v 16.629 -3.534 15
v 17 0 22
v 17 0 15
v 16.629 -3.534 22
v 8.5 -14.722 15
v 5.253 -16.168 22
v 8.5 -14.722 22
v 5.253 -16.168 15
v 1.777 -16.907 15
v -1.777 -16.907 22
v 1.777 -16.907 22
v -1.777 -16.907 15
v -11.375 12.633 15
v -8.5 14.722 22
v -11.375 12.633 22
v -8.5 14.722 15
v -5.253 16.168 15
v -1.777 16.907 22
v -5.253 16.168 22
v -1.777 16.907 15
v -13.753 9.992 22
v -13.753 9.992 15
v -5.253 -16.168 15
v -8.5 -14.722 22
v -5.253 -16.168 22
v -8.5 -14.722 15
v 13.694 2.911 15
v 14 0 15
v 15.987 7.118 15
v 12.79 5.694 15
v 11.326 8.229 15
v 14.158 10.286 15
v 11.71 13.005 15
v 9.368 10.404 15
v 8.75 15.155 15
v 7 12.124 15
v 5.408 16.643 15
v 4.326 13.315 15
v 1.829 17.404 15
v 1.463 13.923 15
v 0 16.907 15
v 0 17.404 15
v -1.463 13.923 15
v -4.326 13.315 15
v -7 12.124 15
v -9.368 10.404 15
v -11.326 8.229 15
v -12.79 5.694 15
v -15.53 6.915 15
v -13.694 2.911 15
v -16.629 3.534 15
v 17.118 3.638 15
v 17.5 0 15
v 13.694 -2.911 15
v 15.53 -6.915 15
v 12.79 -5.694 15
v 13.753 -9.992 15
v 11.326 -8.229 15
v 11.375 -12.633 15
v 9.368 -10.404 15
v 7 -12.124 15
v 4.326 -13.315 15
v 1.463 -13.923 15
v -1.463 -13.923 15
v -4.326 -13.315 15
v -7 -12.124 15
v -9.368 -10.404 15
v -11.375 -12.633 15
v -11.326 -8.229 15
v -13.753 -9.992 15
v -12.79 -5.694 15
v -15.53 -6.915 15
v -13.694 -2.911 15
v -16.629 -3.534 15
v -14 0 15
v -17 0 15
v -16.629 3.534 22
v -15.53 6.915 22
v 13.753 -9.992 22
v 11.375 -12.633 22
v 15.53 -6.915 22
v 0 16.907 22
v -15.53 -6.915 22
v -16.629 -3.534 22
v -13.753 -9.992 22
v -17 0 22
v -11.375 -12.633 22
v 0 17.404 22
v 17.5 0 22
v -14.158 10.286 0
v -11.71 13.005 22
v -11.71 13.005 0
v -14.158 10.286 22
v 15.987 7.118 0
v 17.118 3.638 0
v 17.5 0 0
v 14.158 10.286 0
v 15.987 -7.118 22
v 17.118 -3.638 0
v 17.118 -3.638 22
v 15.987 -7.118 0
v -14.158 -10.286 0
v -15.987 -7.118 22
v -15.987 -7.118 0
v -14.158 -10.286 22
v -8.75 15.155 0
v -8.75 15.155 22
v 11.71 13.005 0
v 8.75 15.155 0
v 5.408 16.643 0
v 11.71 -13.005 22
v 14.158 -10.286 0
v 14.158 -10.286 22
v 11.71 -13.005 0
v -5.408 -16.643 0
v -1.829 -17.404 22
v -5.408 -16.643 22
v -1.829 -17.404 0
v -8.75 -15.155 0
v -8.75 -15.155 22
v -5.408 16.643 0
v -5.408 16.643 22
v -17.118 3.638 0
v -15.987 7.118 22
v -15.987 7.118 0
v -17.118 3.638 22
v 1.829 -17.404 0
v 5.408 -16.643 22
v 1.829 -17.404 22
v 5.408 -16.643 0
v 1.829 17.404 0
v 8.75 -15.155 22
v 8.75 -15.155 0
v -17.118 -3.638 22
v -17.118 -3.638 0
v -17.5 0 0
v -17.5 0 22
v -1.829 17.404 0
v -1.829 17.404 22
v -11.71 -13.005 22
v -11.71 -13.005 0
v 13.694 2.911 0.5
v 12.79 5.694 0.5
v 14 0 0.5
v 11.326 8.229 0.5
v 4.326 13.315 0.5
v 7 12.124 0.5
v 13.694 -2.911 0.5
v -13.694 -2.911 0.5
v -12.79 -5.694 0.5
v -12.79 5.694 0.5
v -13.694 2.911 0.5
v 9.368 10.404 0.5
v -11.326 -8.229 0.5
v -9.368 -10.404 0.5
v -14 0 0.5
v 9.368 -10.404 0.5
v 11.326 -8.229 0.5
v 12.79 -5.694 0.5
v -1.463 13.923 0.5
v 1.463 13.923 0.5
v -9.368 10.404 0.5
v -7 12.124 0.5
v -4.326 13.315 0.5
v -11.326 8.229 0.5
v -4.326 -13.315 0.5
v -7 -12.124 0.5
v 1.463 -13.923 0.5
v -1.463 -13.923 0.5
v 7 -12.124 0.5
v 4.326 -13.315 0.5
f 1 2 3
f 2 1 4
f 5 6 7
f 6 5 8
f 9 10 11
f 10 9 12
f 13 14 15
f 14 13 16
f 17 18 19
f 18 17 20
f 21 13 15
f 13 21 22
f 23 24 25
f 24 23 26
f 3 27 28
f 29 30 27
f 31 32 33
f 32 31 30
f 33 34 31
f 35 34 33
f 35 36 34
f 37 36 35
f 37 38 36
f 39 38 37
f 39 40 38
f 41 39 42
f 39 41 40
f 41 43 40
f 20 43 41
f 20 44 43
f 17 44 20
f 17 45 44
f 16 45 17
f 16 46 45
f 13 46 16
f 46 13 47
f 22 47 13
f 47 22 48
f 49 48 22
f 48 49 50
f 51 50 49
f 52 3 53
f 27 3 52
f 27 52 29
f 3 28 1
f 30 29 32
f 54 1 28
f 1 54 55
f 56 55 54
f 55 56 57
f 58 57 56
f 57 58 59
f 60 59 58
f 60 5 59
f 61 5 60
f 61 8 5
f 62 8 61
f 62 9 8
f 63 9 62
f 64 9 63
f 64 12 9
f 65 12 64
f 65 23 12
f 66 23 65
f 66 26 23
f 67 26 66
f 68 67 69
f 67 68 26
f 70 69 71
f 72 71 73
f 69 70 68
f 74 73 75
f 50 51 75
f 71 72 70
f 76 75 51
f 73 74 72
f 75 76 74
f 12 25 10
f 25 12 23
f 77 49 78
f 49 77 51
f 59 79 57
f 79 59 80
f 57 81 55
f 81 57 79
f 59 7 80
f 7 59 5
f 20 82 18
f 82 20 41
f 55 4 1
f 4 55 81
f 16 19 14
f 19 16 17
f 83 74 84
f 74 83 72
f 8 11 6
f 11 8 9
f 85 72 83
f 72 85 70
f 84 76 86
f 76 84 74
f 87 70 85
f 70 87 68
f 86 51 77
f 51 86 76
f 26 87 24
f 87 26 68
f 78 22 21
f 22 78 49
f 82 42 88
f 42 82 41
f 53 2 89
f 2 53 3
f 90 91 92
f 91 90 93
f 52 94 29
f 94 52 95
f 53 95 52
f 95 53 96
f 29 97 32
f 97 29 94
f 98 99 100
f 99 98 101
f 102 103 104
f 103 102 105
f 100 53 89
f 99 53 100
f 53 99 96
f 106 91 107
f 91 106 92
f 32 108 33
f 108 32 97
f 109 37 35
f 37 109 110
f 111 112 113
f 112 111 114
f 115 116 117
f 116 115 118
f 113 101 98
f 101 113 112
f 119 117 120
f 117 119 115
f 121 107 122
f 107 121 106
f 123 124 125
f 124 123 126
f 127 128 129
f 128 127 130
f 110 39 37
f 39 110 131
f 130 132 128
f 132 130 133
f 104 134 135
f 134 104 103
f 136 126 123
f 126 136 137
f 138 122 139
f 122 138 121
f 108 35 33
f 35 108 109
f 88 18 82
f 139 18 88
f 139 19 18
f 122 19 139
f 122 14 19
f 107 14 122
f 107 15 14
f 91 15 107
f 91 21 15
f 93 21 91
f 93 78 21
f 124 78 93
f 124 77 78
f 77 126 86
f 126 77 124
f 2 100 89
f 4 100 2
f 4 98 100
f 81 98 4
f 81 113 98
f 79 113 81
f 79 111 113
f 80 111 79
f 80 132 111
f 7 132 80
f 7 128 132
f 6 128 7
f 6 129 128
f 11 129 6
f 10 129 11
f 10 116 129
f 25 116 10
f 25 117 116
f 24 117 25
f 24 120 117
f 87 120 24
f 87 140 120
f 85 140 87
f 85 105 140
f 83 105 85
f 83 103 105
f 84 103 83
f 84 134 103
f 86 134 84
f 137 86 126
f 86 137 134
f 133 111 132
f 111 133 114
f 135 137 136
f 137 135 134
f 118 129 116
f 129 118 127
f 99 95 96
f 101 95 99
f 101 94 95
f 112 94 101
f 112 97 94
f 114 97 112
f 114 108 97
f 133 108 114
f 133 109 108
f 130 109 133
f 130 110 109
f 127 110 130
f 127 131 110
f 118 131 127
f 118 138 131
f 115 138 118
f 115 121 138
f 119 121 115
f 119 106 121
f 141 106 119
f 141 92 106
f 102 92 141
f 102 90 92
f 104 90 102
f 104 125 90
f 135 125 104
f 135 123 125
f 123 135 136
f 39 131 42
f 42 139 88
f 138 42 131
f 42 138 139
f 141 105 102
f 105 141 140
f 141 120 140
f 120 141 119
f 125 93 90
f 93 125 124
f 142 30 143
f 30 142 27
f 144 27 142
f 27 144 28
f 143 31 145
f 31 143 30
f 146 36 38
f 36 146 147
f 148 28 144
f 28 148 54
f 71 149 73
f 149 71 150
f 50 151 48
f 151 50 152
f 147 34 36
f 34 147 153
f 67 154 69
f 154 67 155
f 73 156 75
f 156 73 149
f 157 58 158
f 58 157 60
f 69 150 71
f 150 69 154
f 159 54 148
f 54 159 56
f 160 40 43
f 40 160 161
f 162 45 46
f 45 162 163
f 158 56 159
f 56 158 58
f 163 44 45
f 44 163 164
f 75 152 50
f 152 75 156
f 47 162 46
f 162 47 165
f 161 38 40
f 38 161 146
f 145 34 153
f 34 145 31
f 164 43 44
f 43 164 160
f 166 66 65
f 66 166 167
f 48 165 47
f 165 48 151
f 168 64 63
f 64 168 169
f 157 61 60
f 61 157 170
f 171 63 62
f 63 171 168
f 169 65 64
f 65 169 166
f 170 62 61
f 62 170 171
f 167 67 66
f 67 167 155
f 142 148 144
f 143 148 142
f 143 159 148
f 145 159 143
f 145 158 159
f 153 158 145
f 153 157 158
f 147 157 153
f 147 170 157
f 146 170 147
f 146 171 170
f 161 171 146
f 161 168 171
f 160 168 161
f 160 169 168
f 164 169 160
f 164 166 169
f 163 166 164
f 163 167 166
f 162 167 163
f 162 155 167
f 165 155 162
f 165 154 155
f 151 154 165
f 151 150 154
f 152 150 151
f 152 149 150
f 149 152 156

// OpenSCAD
difference(){
cylinder(22,17.5,17.5);
translate([0,0,0.5]) cylinder(24,14.0,14.0);
translate([0,0,15]) 
    union() {
    cylinder(20,17.0,17.0);
    cube([20,20,20]);
    }
}
